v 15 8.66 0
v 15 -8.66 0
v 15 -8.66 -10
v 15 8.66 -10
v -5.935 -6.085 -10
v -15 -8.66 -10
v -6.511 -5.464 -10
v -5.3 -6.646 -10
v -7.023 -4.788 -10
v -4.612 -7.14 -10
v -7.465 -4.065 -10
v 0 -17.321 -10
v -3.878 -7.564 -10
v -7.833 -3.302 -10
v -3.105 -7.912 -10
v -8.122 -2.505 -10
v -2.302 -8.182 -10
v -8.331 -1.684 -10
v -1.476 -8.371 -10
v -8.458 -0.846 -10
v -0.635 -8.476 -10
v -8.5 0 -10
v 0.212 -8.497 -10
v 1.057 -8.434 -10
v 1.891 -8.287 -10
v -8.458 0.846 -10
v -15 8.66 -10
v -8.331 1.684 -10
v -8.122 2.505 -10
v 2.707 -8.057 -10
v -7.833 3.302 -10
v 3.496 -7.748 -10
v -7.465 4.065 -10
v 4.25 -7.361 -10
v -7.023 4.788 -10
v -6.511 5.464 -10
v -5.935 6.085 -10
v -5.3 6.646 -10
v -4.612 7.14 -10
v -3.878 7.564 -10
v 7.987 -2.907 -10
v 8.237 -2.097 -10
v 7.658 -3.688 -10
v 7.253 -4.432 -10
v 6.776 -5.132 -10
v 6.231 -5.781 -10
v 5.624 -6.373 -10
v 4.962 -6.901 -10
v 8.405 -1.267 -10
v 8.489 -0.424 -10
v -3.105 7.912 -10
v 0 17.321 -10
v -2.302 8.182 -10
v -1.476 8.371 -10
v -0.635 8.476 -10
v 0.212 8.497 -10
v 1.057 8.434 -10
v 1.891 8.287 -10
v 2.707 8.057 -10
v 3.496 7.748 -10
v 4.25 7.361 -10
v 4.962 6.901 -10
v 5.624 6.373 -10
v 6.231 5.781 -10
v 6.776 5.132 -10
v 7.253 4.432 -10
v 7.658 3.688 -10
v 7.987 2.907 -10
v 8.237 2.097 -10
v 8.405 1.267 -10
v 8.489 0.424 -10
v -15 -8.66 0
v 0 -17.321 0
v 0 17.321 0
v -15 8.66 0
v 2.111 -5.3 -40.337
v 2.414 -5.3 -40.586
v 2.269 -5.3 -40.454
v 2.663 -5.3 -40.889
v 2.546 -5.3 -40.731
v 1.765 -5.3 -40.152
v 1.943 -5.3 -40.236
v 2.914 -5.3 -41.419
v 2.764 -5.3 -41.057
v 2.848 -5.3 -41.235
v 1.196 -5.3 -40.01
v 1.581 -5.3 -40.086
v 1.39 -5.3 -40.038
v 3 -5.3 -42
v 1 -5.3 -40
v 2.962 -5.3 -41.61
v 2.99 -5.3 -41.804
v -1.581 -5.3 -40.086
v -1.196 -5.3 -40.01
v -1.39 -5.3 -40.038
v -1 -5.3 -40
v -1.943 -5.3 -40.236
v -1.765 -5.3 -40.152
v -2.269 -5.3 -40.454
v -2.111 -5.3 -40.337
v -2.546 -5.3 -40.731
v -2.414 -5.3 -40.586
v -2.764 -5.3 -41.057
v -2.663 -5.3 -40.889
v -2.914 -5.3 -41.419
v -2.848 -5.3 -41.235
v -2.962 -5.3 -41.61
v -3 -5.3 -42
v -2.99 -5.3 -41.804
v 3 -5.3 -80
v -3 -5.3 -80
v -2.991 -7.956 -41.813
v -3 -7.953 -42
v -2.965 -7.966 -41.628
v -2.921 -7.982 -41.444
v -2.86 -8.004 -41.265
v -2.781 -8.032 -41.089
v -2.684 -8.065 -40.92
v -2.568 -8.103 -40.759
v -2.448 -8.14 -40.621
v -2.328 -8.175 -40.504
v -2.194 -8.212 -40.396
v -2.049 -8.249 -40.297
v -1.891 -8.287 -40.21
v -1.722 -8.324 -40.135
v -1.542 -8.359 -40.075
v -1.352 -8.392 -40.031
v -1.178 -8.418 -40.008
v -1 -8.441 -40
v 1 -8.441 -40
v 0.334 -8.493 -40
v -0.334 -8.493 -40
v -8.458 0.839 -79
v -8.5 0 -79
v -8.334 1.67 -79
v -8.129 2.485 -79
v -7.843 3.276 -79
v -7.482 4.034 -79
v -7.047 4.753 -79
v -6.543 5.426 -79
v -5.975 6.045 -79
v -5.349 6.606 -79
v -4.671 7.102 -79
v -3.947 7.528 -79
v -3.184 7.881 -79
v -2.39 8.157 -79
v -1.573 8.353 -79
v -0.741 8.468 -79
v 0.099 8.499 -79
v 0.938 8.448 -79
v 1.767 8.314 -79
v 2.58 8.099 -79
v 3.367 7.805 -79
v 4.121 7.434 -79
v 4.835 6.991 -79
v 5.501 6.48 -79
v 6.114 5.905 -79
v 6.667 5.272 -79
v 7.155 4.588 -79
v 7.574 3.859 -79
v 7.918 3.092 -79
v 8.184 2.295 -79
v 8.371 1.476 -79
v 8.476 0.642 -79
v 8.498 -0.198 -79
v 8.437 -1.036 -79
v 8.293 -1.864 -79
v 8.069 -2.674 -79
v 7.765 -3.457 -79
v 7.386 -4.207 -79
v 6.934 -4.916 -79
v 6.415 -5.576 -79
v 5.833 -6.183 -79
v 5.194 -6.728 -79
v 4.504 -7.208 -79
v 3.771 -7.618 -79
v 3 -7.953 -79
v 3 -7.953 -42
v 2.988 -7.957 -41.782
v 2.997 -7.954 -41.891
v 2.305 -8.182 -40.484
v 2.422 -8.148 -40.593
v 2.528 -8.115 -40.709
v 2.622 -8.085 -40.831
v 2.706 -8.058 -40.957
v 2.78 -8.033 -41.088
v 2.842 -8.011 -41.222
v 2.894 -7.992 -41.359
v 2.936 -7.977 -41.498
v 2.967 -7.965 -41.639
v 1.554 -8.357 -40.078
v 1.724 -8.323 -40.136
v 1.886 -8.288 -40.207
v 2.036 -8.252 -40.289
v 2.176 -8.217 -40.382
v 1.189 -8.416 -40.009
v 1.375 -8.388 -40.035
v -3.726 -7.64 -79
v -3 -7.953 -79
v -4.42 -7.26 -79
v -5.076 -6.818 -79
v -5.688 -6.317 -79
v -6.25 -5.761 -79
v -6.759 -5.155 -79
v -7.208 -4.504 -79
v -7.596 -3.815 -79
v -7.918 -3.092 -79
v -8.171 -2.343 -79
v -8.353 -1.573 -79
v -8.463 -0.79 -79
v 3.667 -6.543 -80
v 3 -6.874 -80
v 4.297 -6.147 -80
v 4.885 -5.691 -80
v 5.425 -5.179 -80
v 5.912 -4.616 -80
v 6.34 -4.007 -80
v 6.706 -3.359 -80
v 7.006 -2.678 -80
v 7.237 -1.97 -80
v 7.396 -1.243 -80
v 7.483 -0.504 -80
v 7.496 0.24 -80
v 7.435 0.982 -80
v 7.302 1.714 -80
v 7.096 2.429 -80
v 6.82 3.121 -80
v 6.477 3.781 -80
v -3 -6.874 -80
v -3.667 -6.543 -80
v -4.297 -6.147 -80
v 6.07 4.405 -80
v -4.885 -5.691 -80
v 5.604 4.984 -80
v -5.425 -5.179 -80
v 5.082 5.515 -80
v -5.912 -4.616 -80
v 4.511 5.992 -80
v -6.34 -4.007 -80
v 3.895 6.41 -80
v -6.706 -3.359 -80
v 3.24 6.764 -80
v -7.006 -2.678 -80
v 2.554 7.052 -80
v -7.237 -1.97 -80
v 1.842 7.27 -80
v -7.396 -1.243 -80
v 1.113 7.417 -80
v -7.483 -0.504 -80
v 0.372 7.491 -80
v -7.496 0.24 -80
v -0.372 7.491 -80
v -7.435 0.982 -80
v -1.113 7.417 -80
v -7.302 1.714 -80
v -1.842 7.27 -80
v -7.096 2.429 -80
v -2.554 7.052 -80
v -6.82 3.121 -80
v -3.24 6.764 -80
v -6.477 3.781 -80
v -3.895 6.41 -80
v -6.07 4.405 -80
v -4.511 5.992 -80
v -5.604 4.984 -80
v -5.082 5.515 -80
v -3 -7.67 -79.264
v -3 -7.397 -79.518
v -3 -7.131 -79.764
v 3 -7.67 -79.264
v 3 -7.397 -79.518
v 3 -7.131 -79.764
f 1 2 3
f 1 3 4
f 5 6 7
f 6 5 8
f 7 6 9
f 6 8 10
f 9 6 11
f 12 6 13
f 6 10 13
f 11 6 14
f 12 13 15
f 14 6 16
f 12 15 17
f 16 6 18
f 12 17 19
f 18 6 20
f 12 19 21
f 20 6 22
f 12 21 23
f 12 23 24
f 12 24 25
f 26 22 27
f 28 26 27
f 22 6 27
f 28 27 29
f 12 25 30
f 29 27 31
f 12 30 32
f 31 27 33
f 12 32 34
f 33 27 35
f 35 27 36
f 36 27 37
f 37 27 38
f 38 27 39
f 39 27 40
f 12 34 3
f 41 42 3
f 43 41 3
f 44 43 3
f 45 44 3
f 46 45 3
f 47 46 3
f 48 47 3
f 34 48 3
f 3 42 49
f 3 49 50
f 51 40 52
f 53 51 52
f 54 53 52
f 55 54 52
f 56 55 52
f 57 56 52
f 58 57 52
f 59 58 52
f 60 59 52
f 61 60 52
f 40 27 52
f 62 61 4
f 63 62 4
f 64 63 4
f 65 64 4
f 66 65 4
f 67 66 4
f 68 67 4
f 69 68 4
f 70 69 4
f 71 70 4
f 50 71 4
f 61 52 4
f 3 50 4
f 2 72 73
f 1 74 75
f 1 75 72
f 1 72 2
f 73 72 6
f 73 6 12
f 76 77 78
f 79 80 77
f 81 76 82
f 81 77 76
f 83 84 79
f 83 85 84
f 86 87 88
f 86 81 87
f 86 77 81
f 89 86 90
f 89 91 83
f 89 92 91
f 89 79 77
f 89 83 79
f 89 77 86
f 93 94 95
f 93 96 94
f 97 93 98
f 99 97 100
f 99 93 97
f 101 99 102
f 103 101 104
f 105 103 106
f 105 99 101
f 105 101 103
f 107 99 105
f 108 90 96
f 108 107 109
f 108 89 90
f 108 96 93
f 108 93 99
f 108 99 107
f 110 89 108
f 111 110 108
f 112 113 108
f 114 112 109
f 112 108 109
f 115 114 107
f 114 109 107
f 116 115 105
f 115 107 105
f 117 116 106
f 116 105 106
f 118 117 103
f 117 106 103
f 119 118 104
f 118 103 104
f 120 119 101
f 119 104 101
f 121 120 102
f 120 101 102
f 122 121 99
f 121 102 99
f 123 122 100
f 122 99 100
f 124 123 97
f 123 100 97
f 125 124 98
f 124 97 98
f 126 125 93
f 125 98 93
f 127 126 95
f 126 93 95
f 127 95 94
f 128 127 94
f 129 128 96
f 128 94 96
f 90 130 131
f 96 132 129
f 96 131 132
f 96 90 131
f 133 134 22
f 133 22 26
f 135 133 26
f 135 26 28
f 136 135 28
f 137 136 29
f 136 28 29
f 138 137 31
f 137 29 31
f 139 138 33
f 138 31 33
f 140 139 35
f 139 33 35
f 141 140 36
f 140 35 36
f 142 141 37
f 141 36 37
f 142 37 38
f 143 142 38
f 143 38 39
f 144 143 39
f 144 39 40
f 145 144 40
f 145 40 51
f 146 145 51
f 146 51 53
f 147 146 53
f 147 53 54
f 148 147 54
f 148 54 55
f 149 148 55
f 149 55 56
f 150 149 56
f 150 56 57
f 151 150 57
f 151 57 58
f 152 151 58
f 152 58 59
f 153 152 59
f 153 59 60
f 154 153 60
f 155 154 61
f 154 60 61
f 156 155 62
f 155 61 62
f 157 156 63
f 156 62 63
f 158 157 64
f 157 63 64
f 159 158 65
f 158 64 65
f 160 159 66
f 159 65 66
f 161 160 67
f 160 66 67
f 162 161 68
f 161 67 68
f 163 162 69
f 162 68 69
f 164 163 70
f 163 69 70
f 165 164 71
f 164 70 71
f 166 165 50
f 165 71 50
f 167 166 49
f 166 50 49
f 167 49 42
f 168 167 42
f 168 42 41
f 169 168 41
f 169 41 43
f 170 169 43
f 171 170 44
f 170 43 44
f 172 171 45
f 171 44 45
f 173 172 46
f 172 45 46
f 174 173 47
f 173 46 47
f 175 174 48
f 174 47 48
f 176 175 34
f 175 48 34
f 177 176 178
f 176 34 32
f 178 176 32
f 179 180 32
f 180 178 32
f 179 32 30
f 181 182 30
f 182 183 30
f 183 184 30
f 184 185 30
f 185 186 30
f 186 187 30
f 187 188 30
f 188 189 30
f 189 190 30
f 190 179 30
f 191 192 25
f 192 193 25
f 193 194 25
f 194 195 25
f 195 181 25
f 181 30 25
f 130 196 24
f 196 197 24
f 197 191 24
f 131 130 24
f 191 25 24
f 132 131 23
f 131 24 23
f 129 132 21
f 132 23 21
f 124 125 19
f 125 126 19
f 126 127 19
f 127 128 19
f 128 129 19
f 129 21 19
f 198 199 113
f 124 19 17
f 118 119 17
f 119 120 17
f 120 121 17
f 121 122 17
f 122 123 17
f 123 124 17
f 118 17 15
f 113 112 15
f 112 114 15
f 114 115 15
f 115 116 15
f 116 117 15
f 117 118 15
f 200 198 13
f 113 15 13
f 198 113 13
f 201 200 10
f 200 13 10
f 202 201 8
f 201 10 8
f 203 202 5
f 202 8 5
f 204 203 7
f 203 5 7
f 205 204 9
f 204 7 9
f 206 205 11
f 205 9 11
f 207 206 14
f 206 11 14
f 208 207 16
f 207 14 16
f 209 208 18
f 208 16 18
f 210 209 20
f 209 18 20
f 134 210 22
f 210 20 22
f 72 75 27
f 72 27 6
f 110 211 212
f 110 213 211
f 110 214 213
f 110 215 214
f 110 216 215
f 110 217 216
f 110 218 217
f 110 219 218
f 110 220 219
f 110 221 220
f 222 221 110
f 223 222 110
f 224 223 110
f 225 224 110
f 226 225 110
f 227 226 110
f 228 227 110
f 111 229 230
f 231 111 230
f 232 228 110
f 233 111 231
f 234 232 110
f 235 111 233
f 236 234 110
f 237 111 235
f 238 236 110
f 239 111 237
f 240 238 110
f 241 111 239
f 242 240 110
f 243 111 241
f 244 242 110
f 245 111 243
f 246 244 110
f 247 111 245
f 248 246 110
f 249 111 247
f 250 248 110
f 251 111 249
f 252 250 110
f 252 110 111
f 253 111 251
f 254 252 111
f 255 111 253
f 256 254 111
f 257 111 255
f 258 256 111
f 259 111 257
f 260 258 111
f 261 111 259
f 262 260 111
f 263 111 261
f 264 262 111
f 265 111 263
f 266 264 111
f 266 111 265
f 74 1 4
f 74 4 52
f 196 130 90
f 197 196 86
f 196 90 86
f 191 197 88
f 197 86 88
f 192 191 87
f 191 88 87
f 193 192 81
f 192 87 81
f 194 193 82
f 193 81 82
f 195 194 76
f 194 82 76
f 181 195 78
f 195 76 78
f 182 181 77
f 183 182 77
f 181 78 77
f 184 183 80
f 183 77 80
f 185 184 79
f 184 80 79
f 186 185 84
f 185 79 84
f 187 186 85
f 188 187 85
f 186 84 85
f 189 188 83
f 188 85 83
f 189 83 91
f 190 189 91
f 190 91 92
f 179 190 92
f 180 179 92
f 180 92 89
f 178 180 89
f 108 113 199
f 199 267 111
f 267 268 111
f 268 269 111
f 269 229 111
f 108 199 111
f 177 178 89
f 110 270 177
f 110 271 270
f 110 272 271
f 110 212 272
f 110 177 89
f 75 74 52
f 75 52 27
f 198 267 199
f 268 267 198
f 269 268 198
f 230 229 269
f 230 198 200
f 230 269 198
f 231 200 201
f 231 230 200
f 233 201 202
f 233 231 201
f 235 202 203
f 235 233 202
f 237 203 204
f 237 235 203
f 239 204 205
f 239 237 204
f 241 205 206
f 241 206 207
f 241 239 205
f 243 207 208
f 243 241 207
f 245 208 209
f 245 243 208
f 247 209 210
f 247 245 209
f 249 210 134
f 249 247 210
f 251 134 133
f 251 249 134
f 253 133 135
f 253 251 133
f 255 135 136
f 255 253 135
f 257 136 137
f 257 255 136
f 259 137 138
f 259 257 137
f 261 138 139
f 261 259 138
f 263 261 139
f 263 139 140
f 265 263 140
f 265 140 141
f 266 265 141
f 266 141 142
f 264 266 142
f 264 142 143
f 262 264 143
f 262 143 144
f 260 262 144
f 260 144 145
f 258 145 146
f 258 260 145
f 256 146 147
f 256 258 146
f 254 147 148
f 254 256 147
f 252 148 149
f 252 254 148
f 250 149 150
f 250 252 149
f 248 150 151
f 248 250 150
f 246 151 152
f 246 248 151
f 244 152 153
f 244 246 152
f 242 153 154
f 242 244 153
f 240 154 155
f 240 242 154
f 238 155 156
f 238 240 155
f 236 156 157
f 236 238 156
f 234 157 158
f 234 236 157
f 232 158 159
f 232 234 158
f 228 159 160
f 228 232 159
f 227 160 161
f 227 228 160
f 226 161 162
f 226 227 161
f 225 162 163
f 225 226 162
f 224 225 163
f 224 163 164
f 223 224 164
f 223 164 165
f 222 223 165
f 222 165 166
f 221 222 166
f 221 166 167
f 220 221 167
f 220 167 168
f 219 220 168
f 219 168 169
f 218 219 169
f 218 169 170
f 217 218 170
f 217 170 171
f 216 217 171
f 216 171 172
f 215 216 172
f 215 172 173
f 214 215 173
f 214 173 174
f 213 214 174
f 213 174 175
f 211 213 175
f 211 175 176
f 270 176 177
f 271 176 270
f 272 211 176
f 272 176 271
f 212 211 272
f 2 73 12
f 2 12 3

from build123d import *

# Parameters (mm, degrees)
RESSALTO_EXTRUS_O1_DEPTH = 10
ESBO_O2_R                = 8.5
RESSALTO_EXTRUS_O2_DEPTH = 70
ESBO_O3_W                = 6
ESBO_O3_H                = 3.485279131
CORTE_EXTRUS_O1_DEPTH    = 40
FILETE1_R                = 2
CHANFRO1_SIZE            = 1


with BuildPart() as part:
    # Esboço1 → Ressalto-extrusão1 (new body)
    with BuildSketch(Plane.XY):
        Polygon((0, 17.320508076), (-15, 8.660254038), (-15, -8.660254038), (0, -17.320508076), (15, -8.660254038), (15, 8.660254038), align=None)
    extrude(amount=-RESSALTO_EXTRUS_O1_DEPTH)

    # Esboço2 → Ressalto-extrusão2 (add)
    with BuildSketch(Plane(origin=(0, 0, -10), x_dir=(-1, 0, 0), z_dir=(0, 0, -1))):
        Circle(ESBO_O2_R)
    extrude(amount=RESSALTO_EXTRUS_O2_DEPTH)

    # Esboço3 → Corte-extrusão1 (cut)
    with BuildSketch(Plane(origin=(0, 0, -80), x_dir=(-1, 0, 0), z_dir=(0, 0, -1))):
        with Locations((0, -7.042639566)):
            Rectangle(ESBO_O3_W, ESBO_O3_H)
    extrude(amount=-CORTE_EXTRUS_O1_DEPTH, mode=Mode.SUBTRACT)

    # Filete1
    filete1_edges = [part.edges().sort_by_distance(p)[0] for p in [
        (-3, -6.62649343, -40),
        (3, -6.62649343, -40),
    ]]
    fillet(filete1_edges, radius=FILETE1_R)

    # Chanfro1
    chanfro1_edges = [part.edges().sort_by_distance(p)[0] for p in [
        (4.834769901, 6.991065727, -80),
    ]]
    chamfer(chanfro1_edges, length=CHANFRO1_SIZE)


solid = part.part
